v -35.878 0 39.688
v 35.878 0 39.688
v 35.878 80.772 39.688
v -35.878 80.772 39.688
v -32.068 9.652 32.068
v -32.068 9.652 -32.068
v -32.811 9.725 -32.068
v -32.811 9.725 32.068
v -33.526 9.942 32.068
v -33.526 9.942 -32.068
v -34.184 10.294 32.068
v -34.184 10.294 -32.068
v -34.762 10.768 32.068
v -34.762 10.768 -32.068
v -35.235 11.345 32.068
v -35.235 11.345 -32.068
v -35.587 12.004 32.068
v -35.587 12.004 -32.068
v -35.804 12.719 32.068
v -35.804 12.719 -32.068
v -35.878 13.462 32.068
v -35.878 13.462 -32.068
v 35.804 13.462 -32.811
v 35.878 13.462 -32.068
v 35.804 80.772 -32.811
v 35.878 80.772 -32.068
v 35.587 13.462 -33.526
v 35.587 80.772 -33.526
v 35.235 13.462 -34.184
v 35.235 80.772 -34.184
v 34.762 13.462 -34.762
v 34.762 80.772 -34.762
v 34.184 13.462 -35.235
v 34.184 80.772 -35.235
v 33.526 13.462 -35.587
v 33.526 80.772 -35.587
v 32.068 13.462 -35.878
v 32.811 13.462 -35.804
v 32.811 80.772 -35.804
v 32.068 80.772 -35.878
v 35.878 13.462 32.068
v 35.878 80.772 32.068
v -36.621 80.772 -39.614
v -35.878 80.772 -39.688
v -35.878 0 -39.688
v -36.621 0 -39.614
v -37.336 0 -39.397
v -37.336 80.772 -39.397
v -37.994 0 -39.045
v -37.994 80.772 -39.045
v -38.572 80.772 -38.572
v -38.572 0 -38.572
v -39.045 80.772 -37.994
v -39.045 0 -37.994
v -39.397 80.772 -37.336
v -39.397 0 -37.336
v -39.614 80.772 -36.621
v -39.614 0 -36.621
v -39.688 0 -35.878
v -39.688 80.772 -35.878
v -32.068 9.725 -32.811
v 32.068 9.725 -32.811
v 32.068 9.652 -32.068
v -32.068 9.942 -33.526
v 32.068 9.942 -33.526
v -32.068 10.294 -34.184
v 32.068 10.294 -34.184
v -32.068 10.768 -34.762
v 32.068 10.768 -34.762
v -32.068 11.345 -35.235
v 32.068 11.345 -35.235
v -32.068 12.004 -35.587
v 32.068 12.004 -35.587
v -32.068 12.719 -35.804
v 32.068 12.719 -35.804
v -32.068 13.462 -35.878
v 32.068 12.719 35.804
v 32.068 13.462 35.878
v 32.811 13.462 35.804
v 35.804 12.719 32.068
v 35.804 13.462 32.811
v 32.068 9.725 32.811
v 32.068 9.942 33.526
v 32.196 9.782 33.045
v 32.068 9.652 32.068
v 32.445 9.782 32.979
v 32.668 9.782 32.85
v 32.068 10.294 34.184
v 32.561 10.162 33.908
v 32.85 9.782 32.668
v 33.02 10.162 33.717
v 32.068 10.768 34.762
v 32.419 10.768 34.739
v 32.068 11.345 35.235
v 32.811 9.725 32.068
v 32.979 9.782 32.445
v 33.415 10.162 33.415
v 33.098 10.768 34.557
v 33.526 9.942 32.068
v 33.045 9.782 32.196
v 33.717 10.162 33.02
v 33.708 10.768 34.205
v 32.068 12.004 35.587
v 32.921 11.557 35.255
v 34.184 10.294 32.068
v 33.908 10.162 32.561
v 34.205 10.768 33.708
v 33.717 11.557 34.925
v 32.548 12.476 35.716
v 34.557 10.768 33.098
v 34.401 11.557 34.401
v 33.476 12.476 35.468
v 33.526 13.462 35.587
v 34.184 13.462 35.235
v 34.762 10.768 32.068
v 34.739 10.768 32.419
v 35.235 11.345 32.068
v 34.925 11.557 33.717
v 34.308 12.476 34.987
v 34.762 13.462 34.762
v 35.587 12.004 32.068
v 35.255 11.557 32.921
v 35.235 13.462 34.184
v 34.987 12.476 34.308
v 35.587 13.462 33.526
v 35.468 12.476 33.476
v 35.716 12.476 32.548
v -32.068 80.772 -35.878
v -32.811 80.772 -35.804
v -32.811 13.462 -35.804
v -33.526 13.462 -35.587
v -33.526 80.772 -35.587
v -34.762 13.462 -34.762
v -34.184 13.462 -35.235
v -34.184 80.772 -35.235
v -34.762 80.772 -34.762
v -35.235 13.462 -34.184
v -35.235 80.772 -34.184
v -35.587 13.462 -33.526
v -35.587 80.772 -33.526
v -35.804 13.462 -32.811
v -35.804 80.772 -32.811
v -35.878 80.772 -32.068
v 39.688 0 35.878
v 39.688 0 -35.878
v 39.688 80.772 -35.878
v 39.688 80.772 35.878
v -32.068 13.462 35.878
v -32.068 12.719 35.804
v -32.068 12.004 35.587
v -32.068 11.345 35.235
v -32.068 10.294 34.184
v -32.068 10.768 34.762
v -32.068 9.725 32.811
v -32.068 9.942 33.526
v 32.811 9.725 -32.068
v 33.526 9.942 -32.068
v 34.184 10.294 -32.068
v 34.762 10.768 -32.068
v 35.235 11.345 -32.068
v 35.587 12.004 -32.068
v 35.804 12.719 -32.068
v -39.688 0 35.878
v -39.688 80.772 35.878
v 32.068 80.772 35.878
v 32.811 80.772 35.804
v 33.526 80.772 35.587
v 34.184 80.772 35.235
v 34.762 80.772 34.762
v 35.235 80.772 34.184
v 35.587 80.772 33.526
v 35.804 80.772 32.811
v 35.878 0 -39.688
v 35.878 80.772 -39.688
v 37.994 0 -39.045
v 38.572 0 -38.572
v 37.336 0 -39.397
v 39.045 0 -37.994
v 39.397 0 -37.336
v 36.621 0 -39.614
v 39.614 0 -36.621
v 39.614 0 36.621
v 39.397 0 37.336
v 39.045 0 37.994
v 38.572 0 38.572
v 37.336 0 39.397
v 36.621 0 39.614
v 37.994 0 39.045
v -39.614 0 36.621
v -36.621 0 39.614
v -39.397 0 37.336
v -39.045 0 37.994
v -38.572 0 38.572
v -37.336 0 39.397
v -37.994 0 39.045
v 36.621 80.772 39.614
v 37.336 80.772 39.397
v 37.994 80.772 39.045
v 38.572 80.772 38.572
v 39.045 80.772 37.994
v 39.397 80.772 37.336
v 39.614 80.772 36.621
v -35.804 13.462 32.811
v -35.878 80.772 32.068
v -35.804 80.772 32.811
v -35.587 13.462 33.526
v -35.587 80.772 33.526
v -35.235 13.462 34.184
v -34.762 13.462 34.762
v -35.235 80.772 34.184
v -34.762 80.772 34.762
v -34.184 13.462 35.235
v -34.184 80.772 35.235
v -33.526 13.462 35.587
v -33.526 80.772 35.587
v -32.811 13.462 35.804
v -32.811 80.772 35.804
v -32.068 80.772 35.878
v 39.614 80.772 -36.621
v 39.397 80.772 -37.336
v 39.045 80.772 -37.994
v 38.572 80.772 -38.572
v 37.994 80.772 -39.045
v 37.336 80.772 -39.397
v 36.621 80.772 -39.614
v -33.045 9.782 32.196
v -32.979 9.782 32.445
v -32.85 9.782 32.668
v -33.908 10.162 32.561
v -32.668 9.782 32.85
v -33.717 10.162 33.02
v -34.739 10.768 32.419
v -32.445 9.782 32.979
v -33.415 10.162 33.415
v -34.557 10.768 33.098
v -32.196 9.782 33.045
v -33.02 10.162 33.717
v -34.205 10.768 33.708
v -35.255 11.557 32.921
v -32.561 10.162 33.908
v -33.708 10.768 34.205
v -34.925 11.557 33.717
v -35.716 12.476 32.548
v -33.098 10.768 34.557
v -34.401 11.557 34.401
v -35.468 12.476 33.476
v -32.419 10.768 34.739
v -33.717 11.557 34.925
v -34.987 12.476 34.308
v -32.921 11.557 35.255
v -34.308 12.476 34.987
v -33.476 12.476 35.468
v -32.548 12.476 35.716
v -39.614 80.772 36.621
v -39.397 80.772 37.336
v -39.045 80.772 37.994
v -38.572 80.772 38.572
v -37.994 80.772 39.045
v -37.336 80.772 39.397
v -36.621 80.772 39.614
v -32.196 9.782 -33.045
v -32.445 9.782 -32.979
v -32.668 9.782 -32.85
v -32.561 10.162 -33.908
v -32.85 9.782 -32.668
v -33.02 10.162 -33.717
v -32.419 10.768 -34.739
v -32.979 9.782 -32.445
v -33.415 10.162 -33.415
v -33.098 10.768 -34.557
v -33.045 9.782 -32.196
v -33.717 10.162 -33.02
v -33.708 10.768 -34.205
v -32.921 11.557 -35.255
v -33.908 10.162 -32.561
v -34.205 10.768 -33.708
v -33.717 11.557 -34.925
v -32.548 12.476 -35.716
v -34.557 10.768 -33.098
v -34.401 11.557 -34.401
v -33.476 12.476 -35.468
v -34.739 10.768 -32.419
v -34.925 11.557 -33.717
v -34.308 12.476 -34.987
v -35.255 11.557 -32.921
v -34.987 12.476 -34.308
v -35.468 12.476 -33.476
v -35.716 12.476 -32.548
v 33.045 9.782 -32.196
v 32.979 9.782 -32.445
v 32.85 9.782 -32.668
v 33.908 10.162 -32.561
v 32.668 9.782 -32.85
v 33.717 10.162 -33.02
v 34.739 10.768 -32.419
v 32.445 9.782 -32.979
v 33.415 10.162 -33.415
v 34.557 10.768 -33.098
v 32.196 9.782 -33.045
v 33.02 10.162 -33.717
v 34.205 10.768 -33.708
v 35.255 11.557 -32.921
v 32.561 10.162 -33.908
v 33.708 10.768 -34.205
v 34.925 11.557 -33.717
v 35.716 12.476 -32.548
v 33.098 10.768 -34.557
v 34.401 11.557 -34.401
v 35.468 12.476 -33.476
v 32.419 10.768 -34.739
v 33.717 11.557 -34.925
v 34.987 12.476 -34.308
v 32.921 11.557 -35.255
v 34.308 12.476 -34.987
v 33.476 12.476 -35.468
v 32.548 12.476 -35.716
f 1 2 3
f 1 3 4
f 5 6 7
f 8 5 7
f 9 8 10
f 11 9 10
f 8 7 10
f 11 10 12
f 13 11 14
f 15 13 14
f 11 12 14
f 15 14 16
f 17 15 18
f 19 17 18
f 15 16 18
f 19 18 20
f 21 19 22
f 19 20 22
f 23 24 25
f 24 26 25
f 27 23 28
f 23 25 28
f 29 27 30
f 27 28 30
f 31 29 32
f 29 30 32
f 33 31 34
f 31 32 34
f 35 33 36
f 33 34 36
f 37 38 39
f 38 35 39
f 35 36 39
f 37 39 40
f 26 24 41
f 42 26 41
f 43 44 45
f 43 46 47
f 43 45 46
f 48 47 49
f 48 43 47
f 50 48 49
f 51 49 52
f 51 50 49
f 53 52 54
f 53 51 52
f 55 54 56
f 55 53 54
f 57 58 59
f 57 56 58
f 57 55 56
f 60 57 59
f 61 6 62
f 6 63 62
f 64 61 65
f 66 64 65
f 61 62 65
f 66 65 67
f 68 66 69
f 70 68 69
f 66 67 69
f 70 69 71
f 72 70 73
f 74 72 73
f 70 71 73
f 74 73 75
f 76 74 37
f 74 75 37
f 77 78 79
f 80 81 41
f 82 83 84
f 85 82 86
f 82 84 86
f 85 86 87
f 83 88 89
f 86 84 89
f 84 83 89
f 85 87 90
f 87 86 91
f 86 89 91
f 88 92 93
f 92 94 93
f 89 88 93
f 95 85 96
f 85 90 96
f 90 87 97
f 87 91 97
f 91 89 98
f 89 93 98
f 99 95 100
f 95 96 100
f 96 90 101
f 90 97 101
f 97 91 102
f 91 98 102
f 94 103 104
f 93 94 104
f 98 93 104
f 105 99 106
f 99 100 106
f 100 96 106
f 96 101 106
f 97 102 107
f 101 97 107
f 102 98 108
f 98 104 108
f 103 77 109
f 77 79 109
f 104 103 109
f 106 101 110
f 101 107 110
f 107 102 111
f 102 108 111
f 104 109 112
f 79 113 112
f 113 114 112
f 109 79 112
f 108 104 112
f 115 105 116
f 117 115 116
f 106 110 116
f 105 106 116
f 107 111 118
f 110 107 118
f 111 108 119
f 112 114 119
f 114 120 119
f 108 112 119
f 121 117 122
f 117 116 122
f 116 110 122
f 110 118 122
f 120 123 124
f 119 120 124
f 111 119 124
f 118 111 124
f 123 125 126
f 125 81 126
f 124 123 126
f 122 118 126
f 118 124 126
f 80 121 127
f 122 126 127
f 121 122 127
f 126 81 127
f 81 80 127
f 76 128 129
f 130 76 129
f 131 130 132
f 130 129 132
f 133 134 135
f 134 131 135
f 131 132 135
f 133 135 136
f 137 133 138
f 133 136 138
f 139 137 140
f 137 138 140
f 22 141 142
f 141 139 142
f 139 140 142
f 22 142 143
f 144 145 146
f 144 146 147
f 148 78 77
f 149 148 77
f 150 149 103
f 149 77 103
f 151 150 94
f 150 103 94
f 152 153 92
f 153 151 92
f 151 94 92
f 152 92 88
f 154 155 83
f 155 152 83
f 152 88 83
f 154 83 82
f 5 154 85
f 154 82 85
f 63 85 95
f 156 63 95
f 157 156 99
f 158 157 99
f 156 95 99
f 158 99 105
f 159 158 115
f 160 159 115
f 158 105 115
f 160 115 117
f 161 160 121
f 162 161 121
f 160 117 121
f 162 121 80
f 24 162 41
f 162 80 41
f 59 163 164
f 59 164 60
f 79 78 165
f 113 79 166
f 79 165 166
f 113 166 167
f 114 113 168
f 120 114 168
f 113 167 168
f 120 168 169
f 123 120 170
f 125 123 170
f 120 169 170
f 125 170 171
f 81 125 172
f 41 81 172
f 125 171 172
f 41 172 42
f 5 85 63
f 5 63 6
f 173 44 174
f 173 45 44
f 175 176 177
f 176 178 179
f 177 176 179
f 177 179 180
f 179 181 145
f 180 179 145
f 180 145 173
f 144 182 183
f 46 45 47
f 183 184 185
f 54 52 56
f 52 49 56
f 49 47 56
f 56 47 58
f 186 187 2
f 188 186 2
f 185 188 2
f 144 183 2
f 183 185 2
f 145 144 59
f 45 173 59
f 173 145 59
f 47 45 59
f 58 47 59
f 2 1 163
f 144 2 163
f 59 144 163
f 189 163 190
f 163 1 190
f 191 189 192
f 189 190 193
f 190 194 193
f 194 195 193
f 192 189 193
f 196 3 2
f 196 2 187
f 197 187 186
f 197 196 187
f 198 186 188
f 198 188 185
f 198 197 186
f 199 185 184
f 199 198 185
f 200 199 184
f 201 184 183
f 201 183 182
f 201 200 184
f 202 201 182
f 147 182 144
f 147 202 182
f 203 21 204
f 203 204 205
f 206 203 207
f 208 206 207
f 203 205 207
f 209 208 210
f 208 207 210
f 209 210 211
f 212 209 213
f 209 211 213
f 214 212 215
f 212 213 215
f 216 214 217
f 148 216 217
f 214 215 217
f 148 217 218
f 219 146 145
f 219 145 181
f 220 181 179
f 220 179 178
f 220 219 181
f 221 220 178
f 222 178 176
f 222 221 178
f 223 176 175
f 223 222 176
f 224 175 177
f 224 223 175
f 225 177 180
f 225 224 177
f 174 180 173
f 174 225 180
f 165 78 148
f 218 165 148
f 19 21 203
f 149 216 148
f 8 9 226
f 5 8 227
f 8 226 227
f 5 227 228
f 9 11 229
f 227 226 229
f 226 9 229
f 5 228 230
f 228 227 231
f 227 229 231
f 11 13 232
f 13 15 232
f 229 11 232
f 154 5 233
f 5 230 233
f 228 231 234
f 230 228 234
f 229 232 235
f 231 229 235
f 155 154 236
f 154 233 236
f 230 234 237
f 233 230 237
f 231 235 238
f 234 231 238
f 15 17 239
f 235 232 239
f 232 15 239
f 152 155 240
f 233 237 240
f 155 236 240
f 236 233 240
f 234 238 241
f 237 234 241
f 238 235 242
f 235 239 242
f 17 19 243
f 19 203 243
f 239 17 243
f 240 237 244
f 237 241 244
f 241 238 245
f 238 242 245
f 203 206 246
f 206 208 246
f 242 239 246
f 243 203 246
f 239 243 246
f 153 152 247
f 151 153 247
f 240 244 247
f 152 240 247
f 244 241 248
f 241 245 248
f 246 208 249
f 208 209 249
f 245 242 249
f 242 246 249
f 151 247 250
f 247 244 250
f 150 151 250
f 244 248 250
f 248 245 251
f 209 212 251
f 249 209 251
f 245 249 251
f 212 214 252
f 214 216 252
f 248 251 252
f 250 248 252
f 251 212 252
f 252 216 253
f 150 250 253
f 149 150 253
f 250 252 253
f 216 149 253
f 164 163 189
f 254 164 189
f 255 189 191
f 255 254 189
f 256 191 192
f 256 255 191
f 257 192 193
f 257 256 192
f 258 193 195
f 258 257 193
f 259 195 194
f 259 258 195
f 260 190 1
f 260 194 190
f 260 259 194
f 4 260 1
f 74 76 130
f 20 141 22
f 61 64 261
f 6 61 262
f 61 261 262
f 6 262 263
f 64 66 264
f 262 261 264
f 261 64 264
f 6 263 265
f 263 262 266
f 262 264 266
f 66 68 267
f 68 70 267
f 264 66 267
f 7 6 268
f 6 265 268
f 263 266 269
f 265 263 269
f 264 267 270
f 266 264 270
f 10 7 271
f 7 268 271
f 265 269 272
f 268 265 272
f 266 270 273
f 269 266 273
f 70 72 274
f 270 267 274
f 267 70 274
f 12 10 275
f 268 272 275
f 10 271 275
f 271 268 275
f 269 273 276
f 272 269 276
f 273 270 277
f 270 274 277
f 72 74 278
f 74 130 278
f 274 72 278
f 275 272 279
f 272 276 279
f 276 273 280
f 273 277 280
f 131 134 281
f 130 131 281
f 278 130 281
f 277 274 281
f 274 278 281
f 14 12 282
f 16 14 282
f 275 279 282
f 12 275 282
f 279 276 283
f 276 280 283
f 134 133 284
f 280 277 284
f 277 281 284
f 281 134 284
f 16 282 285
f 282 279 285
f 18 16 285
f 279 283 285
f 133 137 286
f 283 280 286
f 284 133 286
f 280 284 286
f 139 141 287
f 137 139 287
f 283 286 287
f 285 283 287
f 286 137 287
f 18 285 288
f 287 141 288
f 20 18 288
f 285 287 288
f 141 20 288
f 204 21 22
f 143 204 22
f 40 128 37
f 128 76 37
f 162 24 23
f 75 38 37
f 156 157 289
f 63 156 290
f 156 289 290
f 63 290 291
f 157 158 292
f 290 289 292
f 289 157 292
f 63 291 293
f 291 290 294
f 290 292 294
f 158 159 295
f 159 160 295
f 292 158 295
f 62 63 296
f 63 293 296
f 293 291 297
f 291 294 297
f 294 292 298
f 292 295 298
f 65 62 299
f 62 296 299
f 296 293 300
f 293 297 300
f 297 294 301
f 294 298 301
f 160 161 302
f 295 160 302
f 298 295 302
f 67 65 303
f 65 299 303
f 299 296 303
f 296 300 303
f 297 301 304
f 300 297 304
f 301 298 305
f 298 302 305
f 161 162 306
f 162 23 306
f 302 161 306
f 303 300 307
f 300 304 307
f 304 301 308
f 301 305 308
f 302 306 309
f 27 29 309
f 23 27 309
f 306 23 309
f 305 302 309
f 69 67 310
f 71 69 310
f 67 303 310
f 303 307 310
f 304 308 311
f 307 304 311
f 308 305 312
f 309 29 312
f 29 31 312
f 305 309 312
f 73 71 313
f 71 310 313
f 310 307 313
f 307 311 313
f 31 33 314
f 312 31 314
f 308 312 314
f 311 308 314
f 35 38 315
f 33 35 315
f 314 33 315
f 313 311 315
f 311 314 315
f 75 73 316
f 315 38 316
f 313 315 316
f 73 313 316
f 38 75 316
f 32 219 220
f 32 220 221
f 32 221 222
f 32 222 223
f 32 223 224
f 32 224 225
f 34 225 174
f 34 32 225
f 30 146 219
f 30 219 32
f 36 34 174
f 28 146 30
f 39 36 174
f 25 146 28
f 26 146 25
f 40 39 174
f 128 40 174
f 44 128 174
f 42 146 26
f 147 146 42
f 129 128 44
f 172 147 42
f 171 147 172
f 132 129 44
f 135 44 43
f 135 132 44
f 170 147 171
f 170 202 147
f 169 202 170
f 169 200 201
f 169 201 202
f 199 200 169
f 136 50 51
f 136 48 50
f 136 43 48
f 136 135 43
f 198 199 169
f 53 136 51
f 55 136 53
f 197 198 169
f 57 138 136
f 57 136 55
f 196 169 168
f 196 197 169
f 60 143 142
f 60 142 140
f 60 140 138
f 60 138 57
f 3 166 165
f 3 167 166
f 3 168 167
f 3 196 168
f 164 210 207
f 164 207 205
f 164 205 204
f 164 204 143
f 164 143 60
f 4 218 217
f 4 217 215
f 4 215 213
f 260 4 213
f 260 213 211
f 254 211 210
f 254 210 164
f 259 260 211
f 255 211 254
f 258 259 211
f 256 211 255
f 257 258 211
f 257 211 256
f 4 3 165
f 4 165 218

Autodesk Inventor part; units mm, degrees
ref_plane "YZ Plane" through (0, 0, 0) normal (1, 0, 0) x (0, 1, 0)
ref_plane "XZ Plane" through (0, 0, 0) normal (0, 1, 0) x (-1, 0, 0)
ref_plane "XY Plane" through (0, 0, 0) normal (0, 0, 1) x (1, 0, 0)
sketch "Sketch1" plane through (0, 0, 0) normal (0, 1, 0) x (-1, 0, 0)
  line L0 (-39.6875, 39.6875) -> (39.6875, 39.6875)
  line L1 (39.6875, 39.6875) -> (39.6875, -39.6875)
  line L2 (39.6875, -39.6875) -> (-39.6875, -39.6875)
  line L3 (-39.6875, -39.6875) -> (-39.6875, 39.6875)
  line L4 (-39.6875, 39.6875) -> (39.6875, -39.6875) construction
  line L5 (39.6875, 39.6875) -> (-39.6875, -39.6875) construction
  line L6 (-35.8775, 35.8775) -> (35.8775, 35.8775)
  line L7 (35.8775, 35.8775) -> (35.8775, -35.8775)
  line L8 (35.8775, -35.8775) -> (-35.8775, -35.8775)
  line L9 (-35.8775, -35.8775) -> (-35.8775, 35.8775)
  line L10 (-35.8775, 35.8775) -> (35.8775, -35.8775) construction
  line L11 (35.8775, 35.8775) -> (-35.8775, -35.8775) construction
  line L12 (0, -55.5625) -> (0, 55.5625) projected
  point P0 (0, 0)
  dimension "d0" = 3.81
  dimension "d10" = 79.375
  dimension "d11" = 45
extrude "Extrusion1" add sketch "Sketch1" along normal blind 80.772 contours L0 L12 L6 L9 L8 L2 L3 | L0 L1 L2 L12 L8 L7 L6
extrude "Extrusion2" add sketch "Sketch1" along normal blind 9.652 contours L12 L8 L9 L6 | L6 L7 L8 L12
fillet "Fillet1" radius 3.81 12 edges at (-39.6875, 40.386, 39.6875) (-35.8775, 45.212, 35.8775) (-39.6875, 40.386, -39.6875) (-35.8775, 45.212, -35.8775) (35.8775, 45.212, -35.8775) (39.6875, 40.386, -39.6875) (35.8775, 45.212, 35.8775) (39.6875, 40.386, 39.6875) (-35.8775, 9.652, 0) (0, 9.652, 35.8775) (0, 9.652, -35.8775) (35.8775, 9.652, 0)
properties part number "CandleHolder-3" material "Glass"
